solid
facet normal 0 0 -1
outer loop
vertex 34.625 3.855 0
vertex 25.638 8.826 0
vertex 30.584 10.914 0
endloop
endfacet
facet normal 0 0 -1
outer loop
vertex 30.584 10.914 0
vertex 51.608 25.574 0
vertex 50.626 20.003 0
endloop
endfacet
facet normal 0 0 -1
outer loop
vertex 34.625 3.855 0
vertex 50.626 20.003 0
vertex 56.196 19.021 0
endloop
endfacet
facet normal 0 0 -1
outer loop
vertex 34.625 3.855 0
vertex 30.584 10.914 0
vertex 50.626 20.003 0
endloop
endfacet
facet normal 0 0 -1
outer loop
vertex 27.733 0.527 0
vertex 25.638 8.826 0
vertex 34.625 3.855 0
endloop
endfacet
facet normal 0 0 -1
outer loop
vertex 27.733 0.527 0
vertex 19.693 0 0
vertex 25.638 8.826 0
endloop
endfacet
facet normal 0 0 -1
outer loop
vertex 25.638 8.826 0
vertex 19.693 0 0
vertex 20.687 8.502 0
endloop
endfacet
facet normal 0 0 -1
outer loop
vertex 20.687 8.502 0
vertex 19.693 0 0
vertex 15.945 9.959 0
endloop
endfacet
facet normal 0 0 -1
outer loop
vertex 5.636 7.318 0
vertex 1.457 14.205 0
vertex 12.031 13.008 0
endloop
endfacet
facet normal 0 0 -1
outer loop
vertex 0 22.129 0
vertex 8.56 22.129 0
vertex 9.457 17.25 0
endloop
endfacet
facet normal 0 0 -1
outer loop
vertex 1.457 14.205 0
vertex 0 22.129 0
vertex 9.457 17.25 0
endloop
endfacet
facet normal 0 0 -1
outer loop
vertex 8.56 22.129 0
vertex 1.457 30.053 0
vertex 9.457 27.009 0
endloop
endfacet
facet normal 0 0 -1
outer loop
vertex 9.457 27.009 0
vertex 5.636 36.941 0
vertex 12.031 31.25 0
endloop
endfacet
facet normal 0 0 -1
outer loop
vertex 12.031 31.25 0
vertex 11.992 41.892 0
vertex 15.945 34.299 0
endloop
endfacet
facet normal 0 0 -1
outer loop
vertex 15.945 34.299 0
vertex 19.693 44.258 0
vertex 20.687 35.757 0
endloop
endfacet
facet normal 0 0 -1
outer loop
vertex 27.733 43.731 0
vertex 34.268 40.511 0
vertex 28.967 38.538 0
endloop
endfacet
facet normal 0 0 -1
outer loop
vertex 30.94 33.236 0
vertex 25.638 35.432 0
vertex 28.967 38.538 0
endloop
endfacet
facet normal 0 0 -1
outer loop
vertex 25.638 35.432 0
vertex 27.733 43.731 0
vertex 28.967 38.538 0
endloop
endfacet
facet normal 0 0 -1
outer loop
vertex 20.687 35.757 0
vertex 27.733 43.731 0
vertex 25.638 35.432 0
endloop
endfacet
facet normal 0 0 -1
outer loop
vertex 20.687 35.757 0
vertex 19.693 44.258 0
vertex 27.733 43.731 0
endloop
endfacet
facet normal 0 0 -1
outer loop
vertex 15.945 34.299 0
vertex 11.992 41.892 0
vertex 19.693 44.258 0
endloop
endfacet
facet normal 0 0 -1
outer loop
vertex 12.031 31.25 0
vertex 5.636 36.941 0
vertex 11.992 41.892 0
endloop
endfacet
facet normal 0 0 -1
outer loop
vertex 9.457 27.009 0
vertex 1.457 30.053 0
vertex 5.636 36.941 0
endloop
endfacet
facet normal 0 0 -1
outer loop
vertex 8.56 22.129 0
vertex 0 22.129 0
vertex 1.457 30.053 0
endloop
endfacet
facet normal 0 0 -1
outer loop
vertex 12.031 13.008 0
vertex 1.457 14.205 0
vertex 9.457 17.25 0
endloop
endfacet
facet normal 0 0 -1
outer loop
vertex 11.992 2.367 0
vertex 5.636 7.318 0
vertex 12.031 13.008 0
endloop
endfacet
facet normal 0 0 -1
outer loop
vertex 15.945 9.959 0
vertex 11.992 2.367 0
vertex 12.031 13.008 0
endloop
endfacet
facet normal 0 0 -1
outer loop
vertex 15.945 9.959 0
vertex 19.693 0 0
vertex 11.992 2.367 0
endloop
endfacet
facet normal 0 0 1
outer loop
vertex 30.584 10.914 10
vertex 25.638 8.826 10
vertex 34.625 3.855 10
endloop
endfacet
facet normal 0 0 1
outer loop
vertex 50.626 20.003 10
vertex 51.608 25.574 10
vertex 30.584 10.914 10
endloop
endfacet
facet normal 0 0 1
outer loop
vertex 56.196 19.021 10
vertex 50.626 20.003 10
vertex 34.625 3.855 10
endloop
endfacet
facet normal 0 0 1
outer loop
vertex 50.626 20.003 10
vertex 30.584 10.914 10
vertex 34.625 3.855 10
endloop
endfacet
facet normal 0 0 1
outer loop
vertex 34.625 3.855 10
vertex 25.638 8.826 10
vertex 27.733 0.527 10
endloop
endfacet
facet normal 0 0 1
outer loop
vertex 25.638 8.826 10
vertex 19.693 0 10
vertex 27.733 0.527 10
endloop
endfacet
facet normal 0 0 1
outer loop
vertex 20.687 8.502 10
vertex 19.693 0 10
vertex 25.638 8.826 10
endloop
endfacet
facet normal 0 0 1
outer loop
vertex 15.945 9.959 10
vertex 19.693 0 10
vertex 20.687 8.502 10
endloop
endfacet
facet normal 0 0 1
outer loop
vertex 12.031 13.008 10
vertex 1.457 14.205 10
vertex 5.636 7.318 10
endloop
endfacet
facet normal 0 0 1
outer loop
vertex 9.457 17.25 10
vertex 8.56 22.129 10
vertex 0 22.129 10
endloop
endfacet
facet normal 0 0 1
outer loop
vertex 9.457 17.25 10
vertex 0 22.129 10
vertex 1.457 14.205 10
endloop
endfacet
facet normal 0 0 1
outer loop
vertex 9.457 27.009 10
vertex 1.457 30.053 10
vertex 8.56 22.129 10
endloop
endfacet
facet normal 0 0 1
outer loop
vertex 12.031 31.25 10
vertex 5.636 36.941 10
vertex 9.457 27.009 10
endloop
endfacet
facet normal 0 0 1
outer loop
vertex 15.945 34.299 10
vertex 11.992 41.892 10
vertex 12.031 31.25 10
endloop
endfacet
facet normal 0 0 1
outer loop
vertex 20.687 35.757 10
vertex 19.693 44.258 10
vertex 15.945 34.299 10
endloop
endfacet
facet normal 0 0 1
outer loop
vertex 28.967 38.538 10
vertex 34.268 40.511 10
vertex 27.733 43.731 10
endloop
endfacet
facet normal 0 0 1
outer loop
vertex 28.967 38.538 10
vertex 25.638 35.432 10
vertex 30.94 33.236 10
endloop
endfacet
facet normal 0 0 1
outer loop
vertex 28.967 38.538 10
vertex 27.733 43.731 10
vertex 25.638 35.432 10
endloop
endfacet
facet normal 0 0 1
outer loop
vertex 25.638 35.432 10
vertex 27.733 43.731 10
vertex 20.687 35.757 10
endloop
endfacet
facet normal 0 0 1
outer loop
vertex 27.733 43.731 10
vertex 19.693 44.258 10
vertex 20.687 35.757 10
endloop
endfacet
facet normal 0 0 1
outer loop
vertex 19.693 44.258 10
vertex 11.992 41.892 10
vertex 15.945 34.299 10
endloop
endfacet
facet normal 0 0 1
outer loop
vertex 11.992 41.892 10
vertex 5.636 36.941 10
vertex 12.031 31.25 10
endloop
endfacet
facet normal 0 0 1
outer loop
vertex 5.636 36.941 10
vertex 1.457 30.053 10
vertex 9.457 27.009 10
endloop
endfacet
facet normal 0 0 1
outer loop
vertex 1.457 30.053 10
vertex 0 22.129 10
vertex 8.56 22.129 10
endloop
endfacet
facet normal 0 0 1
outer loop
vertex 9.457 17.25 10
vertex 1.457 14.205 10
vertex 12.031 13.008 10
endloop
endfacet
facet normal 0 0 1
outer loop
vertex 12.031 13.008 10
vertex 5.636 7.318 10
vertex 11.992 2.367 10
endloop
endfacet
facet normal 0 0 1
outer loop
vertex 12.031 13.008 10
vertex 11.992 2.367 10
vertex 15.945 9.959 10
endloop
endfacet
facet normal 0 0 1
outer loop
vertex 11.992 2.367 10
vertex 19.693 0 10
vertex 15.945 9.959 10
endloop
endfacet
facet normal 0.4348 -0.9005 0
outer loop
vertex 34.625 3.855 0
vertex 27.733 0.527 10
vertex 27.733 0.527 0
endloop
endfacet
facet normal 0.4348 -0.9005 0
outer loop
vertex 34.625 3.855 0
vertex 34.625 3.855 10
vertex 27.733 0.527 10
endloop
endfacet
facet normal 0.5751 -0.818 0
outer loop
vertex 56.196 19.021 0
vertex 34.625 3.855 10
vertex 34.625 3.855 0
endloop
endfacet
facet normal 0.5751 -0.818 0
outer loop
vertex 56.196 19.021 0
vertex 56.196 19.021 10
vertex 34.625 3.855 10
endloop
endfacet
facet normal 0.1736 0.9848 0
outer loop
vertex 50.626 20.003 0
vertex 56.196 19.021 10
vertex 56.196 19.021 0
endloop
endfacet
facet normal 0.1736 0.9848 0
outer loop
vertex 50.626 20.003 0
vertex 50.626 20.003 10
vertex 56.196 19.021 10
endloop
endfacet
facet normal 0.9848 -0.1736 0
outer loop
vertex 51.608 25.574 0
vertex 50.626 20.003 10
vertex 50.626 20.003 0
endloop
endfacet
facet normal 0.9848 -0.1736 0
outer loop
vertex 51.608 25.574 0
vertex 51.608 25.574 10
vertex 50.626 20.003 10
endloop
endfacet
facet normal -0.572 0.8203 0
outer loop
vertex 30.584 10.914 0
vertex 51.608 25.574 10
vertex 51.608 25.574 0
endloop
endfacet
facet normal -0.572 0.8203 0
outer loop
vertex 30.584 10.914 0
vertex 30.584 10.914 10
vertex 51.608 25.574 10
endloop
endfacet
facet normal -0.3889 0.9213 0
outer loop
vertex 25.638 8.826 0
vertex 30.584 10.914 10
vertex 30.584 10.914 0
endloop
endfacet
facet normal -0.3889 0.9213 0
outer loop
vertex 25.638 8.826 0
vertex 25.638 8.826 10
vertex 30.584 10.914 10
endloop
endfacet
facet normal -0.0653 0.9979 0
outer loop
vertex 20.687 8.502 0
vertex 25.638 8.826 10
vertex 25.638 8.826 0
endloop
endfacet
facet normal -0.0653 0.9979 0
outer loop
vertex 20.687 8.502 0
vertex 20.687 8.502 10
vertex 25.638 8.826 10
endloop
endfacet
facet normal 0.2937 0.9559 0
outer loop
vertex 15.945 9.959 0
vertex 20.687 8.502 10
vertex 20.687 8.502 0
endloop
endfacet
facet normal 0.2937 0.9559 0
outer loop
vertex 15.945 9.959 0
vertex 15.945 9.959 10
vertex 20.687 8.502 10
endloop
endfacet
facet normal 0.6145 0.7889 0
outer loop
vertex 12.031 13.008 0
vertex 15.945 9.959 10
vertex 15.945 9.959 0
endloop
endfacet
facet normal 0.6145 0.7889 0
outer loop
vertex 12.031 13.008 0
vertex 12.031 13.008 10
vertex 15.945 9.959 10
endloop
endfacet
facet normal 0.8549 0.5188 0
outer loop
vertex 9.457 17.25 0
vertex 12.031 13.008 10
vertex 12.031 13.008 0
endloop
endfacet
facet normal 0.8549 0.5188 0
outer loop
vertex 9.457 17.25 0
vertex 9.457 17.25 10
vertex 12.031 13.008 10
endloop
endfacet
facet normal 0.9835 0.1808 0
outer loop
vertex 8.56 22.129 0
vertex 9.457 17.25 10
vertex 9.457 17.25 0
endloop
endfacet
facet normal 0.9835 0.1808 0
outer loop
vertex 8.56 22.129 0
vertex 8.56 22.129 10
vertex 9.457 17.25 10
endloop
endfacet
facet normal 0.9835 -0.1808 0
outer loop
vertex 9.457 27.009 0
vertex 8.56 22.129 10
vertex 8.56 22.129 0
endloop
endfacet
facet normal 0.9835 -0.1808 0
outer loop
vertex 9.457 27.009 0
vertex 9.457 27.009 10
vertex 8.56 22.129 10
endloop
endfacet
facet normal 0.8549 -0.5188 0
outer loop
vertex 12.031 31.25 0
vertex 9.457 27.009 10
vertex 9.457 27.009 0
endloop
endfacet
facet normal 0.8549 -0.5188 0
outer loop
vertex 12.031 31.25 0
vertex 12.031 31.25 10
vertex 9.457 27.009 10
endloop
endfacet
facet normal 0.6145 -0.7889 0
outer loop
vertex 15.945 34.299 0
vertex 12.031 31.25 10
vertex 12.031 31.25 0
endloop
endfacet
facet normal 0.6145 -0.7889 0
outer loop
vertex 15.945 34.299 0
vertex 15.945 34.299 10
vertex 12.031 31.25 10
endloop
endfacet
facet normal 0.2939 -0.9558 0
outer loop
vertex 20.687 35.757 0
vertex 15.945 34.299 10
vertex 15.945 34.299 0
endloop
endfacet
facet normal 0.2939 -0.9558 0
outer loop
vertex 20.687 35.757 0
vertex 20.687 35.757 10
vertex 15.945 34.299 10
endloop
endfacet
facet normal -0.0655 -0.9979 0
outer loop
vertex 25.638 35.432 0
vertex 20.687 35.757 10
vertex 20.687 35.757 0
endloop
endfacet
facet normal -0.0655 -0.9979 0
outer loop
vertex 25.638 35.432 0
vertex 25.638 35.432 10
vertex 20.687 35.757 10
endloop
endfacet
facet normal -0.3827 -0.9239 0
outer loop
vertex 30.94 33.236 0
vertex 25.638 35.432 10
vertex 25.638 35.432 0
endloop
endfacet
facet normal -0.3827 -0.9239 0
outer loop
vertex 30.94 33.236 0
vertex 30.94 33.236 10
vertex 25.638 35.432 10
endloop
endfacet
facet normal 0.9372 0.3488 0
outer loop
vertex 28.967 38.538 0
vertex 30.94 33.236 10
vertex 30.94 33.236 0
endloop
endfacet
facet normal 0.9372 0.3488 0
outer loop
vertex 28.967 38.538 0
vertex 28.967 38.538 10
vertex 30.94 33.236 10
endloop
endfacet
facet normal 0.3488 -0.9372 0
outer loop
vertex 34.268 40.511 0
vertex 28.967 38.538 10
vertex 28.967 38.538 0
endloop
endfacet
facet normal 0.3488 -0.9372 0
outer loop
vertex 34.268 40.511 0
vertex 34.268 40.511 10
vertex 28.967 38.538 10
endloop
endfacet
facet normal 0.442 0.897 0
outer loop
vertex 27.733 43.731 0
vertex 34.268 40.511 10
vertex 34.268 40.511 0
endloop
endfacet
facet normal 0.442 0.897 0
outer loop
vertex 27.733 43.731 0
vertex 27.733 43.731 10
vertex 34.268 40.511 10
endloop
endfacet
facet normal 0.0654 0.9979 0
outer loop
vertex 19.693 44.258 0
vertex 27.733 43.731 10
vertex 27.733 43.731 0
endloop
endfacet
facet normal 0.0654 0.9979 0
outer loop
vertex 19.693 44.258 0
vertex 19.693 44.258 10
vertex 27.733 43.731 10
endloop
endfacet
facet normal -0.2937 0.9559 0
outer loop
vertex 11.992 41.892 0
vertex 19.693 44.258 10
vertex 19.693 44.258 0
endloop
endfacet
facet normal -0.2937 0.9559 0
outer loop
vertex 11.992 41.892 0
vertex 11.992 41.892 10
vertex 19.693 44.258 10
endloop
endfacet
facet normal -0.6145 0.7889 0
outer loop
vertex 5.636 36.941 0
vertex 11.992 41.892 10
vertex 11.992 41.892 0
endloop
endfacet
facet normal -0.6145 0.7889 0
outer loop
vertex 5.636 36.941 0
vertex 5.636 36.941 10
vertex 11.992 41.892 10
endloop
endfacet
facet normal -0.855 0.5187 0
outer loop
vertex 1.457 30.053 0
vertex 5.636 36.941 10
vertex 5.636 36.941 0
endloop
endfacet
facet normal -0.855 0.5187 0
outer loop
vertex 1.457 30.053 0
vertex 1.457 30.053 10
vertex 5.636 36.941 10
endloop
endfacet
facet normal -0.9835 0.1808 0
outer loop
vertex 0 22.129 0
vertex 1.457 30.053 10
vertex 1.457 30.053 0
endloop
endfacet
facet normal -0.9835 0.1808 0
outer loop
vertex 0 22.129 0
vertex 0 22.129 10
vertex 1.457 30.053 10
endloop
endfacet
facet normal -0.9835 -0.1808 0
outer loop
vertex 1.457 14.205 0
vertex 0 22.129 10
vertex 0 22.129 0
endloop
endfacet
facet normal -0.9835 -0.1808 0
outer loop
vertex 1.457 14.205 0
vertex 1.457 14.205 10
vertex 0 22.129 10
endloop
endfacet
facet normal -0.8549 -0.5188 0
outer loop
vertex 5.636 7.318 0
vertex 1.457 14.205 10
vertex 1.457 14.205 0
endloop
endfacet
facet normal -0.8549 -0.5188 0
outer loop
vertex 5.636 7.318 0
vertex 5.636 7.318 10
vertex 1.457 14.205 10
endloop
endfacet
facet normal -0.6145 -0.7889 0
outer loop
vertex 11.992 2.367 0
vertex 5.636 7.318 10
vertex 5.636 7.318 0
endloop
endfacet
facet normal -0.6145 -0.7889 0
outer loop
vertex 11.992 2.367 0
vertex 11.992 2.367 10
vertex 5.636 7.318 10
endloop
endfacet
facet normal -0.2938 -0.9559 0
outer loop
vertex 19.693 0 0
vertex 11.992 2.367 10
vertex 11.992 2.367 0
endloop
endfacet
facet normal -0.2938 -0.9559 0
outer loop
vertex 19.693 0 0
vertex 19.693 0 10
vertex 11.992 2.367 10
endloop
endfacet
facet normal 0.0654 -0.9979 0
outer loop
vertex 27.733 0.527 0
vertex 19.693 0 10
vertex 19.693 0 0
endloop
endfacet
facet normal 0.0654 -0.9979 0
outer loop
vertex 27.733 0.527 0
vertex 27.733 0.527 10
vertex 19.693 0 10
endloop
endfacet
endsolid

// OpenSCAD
$fn = 32;

// ----------------------------------------------------------------------
// Eye lug: ring_tail, 10 mm thick
// ----------------------------------------------------------------------

// --- parameters (mm) ---
profile_height = 10;      // extrusion height
profile_points = 30;      // points of the closed outline

profile = [[28.967, 38.538], [34.268, 40.511], [27.733, 43.731], [19.693, 44.258], [11.992, 41.892], [5.636, 36.941], [1.457, 30.053], [0, 22.129], [1.457, 14.205], [5.636, 7.318], [11.992, 2.367], [19.693, 0], [27.733, 0.527], [34.625, 3.855], [56.196, 19.021], [50.626, 20.003], [51.608, 25.574], [30.584, 10.914], [25.638, 8.826], [20.687, 8.502], [15.945, 9.959], [12.031, 13.008], [9.457, 17.25], [8.56, 22.129], [9.457, 27.009], [12.031, 31.25], [15.945, 34.299], [20.687, 35.757], [25.638, 35.432], [30.94, 33.236]];  // single closed polygon, 30 points, counter clockwise

// --- the one profile operation ---
linear_extrude(height = profile_height) polygon(points = profile);
